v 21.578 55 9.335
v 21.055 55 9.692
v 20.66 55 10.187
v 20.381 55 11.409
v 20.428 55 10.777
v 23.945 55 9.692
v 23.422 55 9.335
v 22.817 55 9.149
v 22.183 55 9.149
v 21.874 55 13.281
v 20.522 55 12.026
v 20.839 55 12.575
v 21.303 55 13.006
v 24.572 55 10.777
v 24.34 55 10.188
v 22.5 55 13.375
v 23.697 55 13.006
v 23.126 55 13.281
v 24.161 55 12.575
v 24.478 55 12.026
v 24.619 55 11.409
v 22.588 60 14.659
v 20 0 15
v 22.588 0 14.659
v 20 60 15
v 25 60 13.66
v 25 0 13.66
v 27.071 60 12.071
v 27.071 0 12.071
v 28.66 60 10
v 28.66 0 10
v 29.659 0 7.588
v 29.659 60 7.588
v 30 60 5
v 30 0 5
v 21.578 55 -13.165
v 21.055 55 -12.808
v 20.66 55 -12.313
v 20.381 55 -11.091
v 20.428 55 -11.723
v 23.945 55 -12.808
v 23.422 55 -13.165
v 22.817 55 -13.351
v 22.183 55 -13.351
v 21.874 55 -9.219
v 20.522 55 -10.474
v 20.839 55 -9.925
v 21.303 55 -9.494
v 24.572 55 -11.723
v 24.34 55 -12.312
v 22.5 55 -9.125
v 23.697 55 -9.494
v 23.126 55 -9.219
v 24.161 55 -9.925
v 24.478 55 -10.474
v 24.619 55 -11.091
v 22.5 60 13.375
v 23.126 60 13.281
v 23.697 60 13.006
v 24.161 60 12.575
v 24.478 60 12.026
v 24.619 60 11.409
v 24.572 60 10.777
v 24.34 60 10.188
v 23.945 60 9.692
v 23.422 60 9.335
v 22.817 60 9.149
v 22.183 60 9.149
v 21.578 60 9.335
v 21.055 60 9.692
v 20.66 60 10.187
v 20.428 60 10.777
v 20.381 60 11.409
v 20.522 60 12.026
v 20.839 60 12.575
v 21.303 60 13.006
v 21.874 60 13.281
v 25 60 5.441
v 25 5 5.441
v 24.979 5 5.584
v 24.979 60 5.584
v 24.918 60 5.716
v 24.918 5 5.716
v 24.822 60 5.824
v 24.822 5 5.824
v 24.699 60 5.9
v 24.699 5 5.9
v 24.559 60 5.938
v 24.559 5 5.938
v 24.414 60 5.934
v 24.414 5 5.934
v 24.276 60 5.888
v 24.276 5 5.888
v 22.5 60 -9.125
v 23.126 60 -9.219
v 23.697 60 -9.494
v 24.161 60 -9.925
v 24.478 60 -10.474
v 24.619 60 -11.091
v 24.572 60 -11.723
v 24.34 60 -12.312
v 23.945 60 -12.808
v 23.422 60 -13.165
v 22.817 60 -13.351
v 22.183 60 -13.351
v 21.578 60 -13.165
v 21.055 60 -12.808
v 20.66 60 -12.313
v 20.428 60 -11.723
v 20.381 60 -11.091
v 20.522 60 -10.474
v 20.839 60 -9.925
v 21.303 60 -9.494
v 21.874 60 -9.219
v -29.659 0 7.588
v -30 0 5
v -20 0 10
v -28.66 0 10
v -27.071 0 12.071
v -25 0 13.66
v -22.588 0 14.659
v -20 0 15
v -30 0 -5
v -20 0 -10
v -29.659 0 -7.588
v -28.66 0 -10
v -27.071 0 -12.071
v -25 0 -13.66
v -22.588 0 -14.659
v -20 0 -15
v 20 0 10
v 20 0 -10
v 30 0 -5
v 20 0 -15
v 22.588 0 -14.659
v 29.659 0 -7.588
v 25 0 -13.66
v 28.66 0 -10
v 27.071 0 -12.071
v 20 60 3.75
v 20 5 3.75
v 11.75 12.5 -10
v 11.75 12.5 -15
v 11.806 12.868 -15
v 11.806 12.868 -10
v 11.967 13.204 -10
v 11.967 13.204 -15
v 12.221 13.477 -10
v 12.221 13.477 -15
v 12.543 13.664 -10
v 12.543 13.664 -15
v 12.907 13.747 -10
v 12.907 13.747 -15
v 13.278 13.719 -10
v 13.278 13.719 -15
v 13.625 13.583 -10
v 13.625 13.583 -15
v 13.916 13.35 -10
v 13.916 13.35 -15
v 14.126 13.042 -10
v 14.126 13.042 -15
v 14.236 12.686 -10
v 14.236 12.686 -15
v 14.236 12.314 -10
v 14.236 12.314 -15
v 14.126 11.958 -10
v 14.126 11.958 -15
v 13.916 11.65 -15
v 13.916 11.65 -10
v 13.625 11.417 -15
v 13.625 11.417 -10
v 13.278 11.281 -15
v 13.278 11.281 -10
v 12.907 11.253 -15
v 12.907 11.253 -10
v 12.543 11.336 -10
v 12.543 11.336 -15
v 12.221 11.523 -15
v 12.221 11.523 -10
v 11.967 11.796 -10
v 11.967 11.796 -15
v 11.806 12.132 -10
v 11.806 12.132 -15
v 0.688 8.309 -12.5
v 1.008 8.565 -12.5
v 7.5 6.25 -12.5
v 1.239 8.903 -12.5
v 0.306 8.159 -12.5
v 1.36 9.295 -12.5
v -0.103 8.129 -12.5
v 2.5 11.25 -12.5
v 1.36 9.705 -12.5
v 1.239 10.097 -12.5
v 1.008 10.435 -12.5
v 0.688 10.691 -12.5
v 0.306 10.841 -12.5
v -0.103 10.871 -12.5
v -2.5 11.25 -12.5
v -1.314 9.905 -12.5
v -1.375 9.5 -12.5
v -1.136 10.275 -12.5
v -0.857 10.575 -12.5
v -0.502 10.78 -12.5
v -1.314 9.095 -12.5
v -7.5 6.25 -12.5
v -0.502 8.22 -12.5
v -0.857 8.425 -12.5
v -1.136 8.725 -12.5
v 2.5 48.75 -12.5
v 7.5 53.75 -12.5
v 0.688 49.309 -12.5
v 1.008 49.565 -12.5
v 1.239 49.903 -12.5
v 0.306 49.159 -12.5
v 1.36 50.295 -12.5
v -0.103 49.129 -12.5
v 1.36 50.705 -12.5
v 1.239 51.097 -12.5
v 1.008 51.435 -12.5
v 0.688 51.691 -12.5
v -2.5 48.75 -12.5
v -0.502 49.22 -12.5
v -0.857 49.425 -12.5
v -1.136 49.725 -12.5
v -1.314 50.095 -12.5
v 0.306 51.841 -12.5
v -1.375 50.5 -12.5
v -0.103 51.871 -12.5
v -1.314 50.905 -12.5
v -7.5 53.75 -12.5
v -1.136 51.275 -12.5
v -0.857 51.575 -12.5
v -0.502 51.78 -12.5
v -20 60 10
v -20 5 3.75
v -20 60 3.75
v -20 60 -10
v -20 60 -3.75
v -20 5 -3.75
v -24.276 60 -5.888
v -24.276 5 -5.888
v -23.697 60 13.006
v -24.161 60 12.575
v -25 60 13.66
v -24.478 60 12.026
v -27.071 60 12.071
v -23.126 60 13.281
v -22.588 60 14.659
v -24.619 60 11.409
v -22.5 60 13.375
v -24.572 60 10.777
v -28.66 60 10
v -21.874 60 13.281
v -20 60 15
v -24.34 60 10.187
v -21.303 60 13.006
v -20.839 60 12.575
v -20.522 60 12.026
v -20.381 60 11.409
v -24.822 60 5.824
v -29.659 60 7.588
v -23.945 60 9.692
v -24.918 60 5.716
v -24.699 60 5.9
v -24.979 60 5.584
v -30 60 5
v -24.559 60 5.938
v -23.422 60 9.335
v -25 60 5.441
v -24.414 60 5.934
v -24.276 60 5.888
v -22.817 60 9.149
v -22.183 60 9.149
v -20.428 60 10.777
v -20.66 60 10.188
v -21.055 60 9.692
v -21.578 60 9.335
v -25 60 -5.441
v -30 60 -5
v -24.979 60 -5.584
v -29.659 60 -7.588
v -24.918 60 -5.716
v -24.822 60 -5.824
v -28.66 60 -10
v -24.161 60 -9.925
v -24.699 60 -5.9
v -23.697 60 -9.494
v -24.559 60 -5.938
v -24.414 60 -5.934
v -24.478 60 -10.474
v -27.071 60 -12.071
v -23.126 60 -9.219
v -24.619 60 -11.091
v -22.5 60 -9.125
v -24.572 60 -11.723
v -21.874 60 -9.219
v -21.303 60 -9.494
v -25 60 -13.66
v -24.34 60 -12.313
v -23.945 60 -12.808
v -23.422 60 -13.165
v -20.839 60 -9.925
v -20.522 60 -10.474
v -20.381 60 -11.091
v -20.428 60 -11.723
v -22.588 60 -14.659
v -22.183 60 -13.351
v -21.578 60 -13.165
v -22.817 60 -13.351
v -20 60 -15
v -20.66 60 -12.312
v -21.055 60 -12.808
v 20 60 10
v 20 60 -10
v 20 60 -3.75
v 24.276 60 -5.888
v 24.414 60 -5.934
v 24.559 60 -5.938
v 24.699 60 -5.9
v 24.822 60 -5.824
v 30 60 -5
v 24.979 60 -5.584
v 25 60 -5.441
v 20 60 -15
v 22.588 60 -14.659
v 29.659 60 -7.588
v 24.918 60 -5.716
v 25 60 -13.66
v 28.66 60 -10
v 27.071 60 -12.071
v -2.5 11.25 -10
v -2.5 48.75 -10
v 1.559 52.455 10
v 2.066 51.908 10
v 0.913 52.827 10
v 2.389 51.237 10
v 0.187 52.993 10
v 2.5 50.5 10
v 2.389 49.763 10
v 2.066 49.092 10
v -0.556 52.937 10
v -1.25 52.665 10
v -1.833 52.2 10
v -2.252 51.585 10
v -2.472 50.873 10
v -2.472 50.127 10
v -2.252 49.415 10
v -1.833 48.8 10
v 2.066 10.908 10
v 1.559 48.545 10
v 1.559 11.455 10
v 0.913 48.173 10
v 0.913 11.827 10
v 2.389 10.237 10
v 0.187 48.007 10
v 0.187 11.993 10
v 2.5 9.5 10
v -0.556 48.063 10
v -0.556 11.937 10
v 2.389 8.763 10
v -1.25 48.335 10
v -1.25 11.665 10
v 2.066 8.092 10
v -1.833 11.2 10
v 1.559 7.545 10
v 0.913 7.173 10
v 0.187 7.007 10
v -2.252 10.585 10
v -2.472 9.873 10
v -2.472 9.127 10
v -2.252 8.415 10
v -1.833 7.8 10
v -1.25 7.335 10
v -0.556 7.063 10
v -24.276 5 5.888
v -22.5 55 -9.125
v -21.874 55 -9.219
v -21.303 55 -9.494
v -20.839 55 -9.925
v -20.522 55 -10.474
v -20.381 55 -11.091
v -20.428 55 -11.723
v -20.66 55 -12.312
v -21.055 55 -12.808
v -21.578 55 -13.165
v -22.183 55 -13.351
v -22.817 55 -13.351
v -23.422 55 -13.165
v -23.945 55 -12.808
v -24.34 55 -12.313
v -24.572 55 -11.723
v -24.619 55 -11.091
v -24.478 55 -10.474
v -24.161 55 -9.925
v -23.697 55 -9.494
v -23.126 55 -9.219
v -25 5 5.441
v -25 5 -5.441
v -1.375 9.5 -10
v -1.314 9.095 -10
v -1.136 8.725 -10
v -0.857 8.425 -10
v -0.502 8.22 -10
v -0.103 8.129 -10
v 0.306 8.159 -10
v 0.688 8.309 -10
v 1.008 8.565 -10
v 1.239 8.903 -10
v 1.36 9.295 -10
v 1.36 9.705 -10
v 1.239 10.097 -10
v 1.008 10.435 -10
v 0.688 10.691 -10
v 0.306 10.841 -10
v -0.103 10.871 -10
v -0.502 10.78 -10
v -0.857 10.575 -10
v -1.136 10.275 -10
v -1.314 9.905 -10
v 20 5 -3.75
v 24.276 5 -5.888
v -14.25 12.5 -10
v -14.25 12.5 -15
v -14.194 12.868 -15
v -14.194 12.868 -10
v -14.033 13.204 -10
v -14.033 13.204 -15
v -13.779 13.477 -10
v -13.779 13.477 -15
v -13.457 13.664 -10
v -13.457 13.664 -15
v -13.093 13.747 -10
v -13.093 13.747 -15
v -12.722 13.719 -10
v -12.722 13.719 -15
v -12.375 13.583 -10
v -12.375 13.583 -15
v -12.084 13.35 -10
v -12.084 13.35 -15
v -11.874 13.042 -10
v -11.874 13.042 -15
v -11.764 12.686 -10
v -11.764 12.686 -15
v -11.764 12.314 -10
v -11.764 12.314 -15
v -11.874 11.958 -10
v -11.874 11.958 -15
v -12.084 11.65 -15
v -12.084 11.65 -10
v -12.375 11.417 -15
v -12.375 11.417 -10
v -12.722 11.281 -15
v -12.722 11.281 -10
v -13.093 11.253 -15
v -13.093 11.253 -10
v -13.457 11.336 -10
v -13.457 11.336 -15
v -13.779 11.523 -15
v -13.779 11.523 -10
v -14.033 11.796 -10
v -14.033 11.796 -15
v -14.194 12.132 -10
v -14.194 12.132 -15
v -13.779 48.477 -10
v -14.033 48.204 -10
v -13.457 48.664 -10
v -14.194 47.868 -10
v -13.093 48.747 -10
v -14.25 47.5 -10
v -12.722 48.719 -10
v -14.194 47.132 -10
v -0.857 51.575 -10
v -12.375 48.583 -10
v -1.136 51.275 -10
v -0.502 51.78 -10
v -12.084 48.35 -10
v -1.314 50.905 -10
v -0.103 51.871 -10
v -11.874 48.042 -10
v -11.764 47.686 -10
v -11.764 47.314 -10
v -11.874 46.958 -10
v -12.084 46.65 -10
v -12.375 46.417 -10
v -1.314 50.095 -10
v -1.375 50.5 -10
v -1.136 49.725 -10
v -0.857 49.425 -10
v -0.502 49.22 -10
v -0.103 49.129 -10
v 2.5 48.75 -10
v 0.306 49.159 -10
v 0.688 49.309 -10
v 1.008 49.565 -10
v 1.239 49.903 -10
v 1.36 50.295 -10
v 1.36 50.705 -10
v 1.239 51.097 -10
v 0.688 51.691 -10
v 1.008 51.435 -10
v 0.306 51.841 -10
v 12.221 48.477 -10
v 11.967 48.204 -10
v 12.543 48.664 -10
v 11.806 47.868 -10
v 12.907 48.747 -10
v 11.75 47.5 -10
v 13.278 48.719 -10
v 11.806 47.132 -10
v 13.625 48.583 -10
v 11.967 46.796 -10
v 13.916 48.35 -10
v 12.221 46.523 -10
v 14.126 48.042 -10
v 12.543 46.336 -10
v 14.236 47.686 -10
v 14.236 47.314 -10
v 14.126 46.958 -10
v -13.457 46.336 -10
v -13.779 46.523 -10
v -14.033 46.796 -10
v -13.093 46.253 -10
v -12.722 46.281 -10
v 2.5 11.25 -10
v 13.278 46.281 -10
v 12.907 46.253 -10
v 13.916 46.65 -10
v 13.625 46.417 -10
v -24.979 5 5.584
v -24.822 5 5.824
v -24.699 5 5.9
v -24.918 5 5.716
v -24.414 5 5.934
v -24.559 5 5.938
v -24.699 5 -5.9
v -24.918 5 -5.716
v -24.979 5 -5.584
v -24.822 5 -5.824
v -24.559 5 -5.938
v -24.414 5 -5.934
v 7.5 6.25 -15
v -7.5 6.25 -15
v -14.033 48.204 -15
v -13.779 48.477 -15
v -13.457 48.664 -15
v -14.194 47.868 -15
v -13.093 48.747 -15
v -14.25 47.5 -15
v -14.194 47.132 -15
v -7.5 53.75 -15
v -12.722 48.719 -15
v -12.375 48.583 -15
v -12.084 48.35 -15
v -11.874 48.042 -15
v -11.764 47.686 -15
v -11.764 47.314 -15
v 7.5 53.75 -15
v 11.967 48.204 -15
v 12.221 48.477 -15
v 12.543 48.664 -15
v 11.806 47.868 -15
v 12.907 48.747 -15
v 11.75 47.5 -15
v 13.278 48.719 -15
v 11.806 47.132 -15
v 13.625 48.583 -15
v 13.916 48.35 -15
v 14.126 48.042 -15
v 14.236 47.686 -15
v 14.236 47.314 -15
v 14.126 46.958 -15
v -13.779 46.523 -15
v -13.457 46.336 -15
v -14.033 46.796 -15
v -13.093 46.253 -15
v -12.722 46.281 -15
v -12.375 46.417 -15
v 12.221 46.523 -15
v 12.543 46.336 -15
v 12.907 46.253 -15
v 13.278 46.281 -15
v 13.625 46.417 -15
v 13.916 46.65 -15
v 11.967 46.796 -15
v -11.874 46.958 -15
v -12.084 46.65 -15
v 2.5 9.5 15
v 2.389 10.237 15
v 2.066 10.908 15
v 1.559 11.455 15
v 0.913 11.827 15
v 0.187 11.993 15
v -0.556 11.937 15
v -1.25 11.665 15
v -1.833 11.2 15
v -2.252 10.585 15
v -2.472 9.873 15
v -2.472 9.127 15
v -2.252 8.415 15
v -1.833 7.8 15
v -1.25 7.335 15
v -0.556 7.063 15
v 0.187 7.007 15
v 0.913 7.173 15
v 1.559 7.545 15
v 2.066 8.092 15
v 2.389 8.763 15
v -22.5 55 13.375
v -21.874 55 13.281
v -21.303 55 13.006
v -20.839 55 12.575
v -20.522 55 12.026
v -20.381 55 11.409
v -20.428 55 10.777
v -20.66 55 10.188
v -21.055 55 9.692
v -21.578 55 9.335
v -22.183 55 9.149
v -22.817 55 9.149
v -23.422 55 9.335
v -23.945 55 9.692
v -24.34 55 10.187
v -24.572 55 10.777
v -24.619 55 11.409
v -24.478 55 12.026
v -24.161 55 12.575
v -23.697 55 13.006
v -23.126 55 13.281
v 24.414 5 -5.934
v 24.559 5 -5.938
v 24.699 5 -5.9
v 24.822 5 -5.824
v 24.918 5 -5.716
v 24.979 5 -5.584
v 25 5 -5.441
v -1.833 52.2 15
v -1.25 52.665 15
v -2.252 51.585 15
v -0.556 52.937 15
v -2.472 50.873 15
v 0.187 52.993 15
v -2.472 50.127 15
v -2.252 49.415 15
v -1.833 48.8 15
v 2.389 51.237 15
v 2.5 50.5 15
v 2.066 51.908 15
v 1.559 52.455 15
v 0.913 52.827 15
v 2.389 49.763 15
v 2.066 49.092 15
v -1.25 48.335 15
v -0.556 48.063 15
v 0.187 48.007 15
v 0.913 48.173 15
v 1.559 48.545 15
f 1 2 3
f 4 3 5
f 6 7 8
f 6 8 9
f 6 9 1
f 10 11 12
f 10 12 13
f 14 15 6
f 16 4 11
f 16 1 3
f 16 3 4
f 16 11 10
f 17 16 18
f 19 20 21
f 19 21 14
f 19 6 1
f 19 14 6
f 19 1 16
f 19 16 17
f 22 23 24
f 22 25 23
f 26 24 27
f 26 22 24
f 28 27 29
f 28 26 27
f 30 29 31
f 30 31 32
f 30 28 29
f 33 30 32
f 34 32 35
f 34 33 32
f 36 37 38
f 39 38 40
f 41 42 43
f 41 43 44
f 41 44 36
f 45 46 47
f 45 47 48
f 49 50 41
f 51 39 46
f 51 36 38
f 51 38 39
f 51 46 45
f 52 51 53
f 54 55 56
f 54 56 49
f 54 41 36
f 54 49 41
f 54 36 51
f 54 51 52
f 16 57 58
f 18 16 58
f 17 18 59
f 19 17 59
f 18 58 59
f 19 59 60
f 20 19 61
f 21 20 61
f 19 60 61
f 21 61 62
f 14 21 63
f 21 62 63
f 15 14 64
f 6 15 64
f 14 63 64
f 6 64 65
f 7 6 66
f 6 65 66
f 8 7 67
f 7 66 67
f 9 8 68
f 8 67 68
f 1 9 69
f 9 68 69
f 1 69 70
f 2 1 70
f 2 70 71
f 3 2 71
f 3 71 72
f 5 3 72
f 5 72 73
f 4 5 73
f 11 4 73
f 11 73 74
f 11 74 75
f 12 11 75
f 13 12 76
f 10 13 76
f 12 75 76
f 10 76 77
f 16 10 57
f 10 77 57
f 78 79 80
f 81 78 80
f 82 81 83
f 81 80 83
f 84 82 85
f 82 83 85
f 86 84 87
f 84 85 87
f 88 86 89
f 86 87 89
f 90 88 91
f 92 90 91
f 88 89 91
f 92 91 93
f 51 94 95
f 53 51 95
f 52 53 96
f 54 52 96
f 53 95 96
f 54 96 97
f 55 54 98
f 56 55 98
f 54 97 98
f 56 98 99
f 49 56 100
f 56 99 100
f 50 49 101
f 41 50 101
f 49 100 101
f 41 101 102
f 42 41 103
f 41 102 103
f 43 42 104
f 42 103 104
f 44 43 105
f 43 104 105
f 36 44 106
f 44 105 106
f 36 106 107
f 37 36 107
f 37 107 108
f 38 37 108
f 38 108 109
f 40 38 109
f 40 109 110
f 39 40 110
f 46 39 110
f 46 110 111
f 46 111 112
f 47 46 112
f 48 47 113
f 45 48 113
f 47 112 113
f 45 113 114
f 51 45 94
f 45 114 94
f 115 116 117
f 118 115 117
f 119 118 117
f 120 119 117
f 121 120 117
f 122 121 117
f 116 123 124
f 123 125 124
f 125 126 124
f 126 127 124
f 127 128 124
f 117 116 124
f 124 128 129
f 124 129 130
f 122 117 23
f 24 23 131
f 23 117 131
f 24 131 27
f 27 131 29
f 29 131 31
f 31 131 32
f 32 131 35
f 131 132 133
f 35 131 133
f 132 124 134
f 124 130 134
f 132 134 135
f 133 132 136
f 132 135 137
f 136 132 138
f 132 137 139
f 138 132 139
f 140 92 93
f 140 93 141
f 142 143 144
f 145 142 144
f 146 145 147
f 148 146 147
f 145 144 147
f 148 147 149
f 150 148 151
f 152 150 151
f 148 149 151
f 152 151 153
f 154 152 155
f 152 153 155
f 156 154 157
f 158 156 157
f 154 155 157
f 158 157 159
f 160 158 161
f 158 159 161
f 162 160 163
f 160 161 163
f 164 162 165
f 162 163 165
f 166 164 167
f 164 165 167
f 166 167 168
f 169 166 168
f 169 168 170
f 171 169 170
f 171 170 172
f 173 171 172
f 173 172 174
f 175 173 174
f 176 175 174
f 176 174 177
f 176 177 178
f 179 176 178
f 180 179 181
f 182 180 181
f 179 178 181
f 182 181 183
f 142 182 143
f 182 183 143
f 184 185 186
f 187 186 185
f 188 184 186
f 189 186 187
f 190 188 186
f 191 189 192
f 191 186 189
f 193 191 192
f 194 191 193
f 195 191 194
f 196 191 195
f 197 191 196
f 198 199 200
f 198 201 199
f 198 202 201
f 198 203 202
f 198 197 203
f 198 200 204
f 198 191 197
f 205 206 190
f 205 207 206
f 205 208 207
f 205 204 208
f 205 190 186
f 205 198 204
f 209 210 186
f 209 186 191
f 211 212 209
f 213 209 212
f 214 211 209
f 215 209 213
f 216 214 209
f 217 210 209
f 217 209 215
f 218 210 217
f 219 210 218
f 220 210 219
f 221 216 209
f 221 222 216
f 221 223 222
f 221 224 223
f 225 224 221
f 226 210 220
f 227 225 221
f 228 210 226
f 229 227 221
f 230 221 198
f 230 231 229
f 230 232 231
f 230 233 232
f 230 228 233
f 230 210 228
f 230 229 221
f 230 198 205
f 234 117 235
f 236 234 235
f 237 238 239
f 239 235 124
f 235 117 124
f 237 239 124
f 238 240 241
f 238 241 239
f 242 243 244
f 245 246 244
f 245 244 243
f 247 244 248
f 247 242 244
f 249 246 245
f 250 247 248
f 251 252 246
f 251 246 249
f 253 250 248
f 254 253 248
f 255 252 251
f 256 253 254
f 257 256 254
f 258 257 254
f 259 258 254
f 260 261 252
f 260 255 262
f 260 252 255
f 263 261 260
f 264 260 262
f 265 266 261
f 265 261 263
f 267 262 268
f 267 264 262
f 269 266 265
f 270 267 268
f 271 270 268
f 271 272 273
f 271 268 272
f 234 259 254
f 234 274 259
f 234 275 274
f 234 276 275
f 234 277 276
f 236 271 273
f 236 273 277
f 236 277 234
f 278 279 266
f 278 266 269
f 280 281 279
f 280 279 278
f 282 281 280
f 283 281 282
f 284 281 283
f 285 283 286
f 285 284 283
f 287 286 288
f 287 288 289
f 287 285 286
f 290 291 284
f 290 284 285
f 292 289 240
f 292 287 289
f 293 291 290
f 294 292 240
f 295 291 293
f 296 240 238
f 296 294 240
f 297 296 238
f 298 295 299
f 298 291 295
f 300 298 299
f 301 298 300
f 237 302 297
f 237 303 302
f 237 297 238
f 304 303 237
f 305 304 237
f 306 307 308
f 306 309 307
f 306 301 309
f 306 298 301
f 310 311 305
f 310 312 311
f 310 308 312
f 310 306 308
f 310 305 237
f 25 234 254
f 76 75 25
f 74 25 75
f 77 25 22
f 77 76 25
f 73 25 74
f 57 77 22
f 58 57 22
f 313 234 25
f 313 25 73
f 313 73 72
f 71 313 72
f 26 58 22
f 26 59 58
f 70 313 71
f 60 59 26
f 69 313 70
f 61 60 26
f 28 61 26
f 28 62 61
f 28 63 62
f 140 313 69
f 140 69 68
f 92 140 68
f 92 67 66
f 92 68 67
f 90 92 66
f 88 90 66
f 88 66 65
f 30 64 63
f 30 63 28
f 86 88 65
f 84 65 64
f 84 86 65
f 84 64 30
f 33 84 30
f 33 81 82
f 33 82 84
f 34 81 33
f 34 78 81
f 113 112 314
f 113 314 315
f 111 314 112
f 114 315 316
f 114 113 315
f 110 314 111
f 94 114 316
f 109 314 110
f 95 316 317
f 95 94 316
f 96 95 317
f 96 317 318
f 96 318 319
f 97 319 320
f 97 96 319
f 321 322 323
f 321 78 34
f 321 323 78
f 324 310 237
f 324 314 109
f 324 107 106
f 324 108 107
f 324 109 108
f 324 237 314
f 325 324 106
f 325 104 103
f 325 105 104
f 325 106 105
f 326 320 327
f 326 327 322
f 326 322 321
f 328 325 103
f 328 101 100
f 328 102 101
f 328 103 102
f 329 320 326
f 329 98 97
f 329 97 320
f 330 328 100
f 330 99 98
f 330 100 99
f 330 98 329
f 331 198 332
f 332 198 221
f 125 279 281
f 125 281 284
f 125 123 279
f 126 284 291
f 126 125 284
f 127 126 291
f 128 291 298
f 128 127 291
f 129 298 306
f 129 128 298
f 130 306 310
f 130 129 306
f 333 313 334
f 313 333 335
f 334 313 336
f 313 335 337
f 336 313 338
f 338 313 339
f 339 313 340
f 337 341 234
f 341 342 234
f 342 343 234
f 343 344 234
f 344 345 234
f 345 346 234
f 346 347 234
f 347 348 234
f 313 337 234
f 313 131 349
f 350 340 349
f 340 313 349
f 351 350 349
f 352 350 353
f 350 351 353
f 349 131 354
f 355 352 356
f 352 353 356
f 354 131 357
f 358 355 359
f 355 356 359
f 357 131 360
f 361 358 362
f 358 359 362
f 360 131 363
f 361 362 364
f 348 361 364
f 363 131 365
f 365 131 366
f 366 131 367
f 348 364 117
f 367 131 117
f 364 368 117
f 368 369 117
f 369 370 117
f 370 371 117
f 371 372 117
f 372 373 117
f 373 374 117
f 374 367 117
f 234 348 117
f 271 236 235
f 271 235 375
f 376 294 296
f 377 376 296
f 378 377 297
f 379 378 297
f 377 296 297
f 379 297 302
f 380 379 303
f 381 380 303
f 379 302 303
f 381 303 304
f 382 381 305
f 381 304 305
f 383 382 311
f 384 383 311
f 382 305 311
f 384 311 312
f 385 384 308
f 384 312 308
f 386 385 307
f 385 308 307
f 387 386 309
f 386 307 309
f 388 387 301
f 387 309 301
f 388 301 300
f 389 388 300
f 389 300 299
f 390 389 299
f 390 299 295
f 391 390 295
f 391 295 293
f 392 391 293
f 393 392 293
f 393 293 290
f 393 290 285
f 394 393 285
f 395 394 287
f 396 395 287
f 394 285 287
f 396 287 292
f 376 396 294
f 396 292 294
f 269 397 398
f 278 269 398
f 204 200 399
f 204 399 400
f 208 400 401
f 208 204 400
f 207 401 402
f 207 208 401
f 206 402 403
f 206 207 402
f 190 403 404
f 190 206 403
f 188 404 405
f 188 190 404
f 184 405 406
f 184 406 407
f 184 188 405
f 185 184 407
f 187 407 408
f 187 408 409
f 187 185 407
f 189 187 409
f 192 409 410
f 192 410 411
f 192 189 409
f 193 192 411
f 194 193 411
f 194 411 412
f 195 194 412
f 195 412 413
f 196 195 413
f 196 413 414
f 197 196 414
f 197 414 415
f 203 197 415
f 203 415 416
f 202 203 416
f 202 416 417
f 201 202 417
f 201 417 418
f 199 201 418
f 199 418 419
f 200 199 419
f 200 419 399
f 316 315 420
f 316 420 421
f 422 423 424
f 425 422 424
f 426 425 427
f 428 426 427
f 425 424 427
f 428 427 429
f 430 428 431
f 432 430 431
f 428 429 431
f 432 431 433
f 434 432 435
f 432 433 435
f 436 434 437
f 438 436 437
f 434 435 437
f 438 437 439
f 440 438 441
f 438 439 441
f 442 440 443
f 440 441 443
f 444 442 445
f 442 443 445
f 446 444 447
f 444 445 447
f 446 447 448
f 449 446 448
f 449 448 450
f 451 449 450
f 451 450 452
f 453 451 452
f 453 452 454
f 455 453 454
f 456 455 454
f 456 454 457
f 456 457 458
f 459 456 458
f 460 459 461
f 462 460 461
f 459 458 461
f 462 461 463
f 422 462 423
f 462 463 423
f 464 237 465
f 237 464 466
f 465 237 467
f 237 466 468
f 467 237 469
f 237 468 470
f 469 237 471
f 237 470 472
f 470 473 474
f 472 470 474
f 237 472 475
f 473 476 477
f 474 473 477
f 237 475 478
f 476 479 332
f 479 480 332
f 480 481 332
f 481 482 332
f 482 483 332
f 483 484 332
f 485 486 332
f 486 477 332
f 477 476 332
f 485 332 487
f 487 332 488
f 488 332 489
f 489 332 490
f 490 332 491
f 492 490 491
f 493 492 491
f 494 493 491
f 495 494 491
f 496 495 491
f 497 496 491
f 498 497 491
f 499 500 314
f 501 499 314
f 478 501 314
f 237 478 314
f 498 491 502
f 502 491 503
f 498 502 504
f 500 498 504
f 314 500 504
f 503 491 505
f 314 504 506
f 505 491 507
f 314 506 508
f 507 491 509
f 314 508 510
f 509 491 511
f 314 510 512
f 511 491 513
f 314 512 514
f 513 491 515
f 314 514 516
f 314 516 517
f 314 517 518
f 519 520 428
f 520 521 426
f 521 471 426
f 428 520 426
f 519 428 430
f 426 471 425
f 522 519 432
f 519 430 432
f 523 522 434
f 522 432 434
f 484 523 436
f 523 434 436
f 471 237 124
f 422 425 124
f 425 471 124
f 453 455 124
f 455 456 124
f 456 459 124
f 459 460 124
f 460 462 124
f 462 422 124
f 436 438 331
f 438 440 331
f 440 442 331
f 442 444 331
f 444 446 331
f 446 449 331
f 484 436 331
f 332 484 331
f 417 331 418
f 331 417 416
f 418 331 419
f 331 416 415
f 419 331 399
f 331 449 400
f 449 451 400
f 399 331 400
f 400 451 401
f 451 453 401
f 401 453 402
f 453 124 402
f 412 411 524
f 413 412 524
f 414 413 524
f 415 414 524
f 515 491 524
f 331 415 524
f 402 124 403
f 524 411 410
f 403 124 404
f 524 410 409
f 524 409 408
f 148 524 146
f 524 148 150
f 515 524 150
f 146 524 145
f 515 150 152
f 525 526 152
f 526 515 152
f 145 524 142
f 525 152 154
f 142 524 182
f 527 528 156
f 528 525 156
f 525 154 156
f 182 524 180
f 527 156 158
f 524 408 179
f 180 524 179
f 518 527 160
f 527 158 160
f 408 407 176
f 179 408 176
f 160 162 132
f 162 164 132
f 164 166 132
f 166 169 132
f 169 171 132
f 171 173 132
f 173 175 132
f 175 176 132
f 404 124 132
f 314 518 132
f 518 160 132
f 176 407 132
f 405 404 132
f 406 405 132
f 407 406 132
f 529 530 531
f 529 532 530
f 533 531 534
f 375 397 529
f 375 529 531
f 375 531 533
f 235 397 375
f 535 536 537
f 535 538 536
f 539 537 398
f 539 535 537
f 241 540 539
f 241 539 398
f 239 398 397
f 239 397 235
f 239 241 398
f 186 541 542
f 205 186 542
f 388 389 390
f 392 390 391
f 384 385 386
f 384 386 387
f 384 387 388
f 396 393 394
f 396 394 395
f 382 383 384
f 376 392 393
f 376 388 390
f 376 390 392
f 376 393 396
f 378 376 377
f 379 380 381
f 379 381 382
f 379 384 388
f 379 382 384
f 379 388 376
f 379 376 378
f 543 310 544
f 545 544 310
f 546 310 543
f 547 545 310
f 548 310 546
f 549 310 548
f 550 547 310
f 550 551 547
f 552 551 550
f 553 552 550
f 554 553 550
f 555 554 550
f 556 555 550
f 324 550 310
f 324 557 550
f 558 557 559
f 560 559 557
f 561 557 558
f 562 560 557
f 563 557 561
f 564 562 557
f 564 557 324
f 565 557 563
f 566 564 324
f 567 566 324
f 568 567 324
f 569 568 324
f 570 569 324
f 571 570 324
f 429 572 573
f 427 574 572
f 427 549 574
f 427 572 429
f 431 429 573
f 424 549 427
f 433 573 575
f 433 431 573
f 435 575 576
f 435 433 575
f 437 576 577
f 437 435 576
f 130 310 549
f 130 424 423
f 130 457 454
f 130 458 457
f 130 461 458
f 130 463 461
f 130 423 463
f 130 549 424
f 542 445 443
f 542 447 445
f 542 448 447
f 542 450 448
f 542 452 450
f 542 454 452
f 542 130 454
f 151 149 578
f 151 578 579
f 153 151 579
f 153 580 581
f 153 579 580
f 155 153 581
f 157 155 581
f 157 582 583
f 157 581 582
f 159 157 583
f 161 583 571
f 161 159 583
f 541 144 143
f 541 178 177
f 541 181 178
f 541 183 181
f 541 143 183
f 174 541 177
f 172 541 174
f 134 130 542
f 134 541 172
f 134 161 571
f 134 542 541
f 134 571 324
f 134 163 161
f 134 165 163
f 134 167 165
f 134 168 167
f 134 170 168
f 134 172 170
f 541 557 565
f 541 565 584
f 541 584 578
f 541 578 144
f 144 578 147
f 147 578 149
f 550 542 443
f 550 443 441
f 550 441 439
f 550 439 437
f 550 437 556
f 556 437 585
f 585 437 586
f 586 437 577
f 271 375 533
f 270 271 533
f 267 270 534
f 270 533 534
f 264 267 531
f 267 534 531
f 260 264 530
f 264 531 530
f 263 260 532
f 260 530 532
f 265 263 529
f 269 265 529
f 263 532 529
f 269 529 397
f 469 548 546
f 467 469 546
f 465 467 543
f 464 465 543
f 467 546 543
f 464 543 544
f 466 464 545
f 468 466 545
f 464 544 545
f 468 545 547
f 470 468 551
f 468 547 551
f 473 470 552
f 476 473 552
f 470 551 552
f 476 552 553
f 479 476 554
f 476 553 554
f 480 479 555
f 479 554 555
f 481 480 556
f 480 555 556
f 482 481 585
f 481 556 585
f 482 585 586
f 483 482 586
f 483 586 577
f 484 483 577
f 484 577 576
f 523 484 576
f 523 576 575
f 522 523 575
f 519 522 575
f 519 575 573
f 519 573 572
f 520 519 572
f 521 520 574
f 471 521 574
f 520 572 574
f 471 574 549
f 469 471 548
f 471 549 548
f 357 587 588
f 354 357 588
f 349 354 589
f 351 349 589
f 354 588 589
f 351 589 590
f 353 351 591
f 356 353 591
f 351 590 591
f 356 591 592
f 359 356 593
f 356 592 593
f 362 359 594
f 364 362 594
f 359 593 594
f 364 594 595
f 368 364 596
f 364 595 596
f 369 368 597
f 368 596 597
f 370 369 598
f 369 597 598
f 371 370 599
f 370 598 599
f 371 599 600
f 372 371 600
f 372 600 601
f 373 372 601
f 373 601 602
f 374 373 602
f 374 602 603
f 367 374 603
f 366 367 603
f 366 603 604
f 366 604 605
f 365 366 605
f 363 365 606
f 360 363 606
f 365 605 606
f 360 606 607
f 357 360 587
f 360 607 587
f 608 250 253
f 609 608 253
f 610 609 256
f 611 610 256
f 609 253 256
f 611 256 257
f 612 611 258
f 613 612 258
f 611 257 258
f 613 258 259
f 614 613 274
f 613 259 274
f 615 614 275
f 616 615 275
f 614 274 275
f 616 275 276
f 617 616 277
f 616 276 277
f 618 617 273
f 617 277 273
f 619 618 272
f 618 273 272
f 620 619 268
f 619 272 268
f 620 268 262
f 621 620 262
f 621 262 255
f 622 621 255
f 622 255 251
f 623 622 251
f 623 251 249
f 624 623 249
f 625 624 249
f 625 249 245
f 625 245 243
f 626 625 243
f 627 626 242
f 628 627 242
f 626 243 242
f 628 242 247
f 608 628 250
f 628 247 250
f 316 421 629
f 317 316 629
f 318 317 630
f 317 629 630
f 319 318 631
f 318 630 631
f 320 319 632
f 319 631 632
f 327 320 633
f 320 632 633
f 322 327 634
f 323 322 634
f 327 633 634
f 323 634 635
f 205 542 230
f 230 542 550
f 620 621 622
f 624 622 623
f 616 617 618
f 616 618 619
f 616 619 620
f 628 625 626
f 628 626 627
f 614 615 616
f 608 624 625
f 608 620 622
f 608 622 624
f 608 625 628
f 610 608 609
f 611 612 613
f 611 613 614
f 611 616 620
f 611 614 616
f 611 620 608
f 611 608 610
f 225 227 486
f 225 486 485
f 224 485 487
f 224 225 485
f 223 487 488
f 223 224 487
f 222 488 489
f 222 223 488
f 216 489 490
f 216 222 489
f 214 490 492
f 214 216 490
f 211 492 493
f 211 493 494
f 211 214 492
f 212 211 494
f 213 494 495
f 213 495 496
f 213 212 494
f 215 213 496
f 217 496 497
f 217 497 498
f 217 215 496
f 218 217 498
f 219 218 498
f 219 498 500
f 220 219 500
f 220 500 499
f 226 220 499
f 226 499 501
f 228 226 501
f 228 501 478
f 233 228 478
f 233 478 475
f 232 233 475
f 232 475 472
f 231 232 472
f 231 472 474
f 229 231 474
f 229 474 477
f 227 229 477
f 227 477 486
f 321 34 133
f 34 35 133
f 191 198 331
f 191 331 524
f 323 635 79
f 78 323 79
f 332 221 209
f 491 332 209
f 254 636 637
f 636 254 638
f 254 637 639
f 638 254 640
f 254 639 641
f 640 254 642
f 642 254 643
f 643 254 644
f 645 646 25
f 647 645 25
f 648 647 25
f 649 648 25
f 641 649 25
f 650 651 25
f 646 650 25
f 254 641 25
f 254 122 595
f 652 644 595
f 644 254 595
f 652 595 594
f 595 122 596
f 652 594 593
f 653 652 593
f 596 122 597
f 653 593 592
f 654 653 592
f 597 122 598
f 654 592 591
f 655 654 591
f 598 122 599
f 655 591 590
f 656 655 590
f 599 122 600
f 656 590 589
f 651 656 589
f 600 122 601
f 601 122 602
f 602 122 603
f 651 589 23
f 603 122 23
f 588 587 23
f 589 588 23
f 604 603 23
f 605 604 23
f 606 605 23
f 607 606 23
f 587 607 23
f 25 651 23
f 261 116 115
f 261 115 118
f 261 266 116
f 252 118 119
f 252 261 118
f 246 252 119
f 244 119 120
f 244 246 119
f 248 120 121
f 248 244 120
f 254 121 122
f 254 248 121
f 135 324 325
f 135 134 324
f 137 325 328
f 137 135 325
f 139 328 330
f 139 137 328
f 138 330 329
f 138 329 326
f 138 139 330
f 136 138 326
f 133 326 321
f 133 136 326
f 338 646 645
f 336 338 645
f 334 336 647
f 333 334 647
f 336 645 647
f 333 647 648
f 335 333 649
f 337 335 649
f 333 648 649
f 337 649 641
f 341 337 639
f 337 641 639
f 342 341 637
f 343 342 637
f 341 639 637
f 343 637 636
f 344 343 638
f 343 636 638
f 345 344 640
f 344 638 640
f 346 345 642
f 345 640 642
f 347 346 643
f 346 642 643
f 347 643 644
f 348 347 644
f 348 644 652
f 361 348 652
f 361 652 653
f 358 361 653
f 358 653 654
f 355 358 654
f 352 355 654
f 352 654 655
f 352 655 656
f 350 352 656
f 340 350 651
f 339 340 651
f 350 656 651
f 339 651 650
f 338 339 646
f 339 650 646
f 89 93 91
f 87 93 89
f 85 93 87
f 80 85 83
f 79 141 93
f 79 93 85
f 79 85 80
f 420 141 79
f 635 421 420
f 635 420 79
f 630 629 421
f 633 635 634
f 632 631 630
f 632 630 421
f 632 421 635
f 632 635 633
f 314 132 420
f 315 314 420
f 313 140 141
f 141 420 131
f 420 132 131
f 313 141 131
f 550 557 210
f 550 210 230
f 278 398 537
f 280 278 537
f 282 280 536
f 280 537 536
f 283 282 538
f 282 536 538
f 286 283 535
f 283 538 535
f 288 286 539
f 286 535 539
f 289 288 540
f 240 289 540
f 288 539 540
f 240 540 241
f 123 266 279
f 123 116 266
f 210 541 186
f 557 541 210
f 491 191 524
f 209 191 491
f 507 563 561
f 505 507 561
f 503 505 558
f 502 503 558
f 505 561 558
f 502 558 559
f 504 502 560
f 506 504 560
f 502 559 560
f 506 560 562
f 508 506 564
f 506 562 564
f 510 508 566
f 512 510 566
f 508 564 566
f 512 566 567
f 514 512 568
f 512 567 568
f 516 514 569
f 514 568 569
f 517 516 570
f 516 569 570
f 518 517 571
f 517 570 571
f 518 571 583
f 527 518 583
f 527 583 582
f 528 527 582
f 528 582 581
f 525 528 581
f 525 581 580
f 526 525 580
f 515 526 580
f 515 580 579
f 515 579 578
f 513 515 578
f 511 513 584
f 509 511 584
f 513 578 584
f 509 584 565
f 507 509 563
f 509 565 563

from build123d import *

# Parameters (mm, degrees)
SKETCH1_W           = 60
SKETCH1_H           = 30
SKETCH1_W_2         = 40
SKETCH1_H_2         = 20
BOSS_EXTRUDE1_DEPTH = 5
SKETCH2_W           = 60
SKETCH2_H           = 30
BOSS_EXTRUDE2_DEPTH = 55
SKETCH4_R           = 1.375
SKETCH4_W           = 5
SKETCH4_H           = 37.5
CUT_EXTRUDE1_DEPTH  = 5
SKETCH5_W           = 15
SKETCH5_H           = 47.5
CUT_EXTRUDE2_DEPTH  = 2.5
FILLET1_R           = 10
SKETCH6_R           = 2.125
CUT_EXTRUDE3_DEPTH  = 5
SKETCH7_R           = 2.5
CUT_EXTRUDE4_DEPTH  = 5
SKETCH8_R           = 1.25
CUT_EXTRUDE5_DEPTH  = 5


with BuildPart() as part:
    # Sketch1 → Boss-Extrude1 (new body)
    with BuildSketch(Plane(origin=(0, 0, 0), x_dir=(1, 0, 0), z_dir=(0, 1, 0))):
        Rectangle(SKETCH1_W, SKETCH1_H)
        Rectangle(SKETCH1_W_2, SKETCH1_H_2, mode=Mode.SUBTRACT)
    extrude(amount=BOSS_EXTRUDE1_DEPTH)

    # Sketch2 → Boss-Extrude2 (add)
    with BuildSketch(Plane(origin=(0, 5, 0), x_dir=(1, 0, 0), z_dir=(0, 1, 0))):
        Rectangle(SKETCH2_W, SKETCH2_H)
        with BuildLine():
            Line((20, 10), (20, 3.75))
            Line((20, 3.75), (24.276393202, 5.888196601))
            ThreePointArc((24.276393202, 5.888196601), (24.762865556, 5.86630841), (25, 5.440983006))
            Line((25, 5.440983006), (25, -5.440983006))
            ThreePointArc((25, -5.440983006), (24.762865556, -5.86630841), (24.276393202, -5.888196601))
            Line((24.276393202, -5.888196601), (20, -3.75))
            Line((20, -3.75), (20, -10))
            Line((20, -10), (-20, -10))
            Line((-20, -10), (-20, -3.75))
            Line((-20, -3.75), (-24.276393202, -5.888196601))
            ThreePointArc((-24.276393202, -5.888196601), (-24.762865556, -5.86630841), (-25, -5.440983006))
            Line((-25, -5.440983006), (-25, 5.440983006))
            ThreePointArc((-25, 5.440983006), (-24.762865556, 5.86630841), (-24.276393202, 5.888196601))
            Line((-24.276393202, 5.888196601), (-20, 3.75))
            Line((-20, 3.75), (-20, 10))
            Line((-20, 10), (20, 10))
        make_face(mode=Mode.SUBTRACT)
    extrude(amount=BOSS_EXTRUDE2_DEPTH)

    # Sketch4 → Cut-Extrude1 (cut)
    with BuildSketch(Plane(origin=(-36.213203436, 0, -15), x_dir=(1, 0, 0), z_dir=(0, 0, 1))):
        with Locations(Location((36.213203436, 50.5, 0), (0, 0, 180))):
            Circle(SKETCH4_R)
        with Locations(Location((36.213203436, 9.5, 0), (0, 0, 180))):
            Circle(SKETCH4_R)
        with Locations((36.213203436, 30)):
            Rectangle(SKETCH4_W, SKETCH4_H)
    extrude(amount=CUT_EXTRUDE1_DEPTH, mode=Mode.SUBTRACT)

    # Sketch5 → Cut-Extrude2 (cut)
    with BuildSketch(Plane(origin=(0, 0, -15), x_dir=(-1, 0, 0), z_dir=(0, 0, -1))):
        with Locations((0, 30)):
            Rectangle(SKETCH5_W, SKETCH5_H)
    extrude(amount=-CUT_EXTRUDE2_DEPTH, mode=Mode.SUBTRACT)

    # Fillet1
    fillet1_edges = [part.edges().sort_by_distance(p)[0] for p in [
        (30, 30, 15),
        (-30, 30, 15),
        (-30, 30, -15),
        (30, 30, -15),
    ]]
    fillet(fillet1_edges, radius=FILLET1_R)

    # Sketch6 → Cut-Extrude3 (cut)
    with BuildSketch(Plane(origin=(0, 60, 0), x_dir=(1, 0, 0), z_dir=(0, 1, 0))):
        with Locations(Location((-22.5, 11.25, 0), (0, 0, 270))):
            Circle(SKETCH6_R)
        with Locations(Location((22.5, 11.25, 0), (0, 0, 270))):
            Circle(SKETCH6_R)
        with Locations(Location((-22.5, -11.25, 0), (0, 0, 270))):
            Circle(SKETCH6_R)
        with Locations(Location((22.5, -11.25, 0), (0, 0, 270))):
            Circle(SKETCH6_R)
    extrude(amount=-CUT_EXTRUDE3_DEPTH, mode=Mode.SUBTRACT)

    # Sketch7 → Cut-Extrude4 (cut)
    with BuildSketch(Plane.XY.offset(15)):
        with Locations((0, 50.5)):
            Circle(SKETCH7_R)
        with Locations((0, 9.5)):
            Circle(SKETCH7_R)
    extrude(amount=-CUT_EXTRUDE4_DEPTH, mode=Mode.SUBTRACT)

    # Sketch8 → Cut-Extrude5 (cut)
    with BuildSketch(Plane(origin=(0, 0, -15), x_dir=(-1, 0, 0), z_dir=(0, 0, -1))):
        with Locations((-13, 47.5)):
            Circle(SKETCH8_R)
        with Locations((13, 47.5)):
            Circle(SKETCH8_R)
        with Locations((-13, 12.5)):
            Circle(SKETCH8_R)
        with Locations((13, 12.5)):
            Circle(SKETCH8_R)
    extrude(amount=-CUT_EXTRUDE5_DEPTH, mode=Mode.SUBTRACT)


solid = part.part
